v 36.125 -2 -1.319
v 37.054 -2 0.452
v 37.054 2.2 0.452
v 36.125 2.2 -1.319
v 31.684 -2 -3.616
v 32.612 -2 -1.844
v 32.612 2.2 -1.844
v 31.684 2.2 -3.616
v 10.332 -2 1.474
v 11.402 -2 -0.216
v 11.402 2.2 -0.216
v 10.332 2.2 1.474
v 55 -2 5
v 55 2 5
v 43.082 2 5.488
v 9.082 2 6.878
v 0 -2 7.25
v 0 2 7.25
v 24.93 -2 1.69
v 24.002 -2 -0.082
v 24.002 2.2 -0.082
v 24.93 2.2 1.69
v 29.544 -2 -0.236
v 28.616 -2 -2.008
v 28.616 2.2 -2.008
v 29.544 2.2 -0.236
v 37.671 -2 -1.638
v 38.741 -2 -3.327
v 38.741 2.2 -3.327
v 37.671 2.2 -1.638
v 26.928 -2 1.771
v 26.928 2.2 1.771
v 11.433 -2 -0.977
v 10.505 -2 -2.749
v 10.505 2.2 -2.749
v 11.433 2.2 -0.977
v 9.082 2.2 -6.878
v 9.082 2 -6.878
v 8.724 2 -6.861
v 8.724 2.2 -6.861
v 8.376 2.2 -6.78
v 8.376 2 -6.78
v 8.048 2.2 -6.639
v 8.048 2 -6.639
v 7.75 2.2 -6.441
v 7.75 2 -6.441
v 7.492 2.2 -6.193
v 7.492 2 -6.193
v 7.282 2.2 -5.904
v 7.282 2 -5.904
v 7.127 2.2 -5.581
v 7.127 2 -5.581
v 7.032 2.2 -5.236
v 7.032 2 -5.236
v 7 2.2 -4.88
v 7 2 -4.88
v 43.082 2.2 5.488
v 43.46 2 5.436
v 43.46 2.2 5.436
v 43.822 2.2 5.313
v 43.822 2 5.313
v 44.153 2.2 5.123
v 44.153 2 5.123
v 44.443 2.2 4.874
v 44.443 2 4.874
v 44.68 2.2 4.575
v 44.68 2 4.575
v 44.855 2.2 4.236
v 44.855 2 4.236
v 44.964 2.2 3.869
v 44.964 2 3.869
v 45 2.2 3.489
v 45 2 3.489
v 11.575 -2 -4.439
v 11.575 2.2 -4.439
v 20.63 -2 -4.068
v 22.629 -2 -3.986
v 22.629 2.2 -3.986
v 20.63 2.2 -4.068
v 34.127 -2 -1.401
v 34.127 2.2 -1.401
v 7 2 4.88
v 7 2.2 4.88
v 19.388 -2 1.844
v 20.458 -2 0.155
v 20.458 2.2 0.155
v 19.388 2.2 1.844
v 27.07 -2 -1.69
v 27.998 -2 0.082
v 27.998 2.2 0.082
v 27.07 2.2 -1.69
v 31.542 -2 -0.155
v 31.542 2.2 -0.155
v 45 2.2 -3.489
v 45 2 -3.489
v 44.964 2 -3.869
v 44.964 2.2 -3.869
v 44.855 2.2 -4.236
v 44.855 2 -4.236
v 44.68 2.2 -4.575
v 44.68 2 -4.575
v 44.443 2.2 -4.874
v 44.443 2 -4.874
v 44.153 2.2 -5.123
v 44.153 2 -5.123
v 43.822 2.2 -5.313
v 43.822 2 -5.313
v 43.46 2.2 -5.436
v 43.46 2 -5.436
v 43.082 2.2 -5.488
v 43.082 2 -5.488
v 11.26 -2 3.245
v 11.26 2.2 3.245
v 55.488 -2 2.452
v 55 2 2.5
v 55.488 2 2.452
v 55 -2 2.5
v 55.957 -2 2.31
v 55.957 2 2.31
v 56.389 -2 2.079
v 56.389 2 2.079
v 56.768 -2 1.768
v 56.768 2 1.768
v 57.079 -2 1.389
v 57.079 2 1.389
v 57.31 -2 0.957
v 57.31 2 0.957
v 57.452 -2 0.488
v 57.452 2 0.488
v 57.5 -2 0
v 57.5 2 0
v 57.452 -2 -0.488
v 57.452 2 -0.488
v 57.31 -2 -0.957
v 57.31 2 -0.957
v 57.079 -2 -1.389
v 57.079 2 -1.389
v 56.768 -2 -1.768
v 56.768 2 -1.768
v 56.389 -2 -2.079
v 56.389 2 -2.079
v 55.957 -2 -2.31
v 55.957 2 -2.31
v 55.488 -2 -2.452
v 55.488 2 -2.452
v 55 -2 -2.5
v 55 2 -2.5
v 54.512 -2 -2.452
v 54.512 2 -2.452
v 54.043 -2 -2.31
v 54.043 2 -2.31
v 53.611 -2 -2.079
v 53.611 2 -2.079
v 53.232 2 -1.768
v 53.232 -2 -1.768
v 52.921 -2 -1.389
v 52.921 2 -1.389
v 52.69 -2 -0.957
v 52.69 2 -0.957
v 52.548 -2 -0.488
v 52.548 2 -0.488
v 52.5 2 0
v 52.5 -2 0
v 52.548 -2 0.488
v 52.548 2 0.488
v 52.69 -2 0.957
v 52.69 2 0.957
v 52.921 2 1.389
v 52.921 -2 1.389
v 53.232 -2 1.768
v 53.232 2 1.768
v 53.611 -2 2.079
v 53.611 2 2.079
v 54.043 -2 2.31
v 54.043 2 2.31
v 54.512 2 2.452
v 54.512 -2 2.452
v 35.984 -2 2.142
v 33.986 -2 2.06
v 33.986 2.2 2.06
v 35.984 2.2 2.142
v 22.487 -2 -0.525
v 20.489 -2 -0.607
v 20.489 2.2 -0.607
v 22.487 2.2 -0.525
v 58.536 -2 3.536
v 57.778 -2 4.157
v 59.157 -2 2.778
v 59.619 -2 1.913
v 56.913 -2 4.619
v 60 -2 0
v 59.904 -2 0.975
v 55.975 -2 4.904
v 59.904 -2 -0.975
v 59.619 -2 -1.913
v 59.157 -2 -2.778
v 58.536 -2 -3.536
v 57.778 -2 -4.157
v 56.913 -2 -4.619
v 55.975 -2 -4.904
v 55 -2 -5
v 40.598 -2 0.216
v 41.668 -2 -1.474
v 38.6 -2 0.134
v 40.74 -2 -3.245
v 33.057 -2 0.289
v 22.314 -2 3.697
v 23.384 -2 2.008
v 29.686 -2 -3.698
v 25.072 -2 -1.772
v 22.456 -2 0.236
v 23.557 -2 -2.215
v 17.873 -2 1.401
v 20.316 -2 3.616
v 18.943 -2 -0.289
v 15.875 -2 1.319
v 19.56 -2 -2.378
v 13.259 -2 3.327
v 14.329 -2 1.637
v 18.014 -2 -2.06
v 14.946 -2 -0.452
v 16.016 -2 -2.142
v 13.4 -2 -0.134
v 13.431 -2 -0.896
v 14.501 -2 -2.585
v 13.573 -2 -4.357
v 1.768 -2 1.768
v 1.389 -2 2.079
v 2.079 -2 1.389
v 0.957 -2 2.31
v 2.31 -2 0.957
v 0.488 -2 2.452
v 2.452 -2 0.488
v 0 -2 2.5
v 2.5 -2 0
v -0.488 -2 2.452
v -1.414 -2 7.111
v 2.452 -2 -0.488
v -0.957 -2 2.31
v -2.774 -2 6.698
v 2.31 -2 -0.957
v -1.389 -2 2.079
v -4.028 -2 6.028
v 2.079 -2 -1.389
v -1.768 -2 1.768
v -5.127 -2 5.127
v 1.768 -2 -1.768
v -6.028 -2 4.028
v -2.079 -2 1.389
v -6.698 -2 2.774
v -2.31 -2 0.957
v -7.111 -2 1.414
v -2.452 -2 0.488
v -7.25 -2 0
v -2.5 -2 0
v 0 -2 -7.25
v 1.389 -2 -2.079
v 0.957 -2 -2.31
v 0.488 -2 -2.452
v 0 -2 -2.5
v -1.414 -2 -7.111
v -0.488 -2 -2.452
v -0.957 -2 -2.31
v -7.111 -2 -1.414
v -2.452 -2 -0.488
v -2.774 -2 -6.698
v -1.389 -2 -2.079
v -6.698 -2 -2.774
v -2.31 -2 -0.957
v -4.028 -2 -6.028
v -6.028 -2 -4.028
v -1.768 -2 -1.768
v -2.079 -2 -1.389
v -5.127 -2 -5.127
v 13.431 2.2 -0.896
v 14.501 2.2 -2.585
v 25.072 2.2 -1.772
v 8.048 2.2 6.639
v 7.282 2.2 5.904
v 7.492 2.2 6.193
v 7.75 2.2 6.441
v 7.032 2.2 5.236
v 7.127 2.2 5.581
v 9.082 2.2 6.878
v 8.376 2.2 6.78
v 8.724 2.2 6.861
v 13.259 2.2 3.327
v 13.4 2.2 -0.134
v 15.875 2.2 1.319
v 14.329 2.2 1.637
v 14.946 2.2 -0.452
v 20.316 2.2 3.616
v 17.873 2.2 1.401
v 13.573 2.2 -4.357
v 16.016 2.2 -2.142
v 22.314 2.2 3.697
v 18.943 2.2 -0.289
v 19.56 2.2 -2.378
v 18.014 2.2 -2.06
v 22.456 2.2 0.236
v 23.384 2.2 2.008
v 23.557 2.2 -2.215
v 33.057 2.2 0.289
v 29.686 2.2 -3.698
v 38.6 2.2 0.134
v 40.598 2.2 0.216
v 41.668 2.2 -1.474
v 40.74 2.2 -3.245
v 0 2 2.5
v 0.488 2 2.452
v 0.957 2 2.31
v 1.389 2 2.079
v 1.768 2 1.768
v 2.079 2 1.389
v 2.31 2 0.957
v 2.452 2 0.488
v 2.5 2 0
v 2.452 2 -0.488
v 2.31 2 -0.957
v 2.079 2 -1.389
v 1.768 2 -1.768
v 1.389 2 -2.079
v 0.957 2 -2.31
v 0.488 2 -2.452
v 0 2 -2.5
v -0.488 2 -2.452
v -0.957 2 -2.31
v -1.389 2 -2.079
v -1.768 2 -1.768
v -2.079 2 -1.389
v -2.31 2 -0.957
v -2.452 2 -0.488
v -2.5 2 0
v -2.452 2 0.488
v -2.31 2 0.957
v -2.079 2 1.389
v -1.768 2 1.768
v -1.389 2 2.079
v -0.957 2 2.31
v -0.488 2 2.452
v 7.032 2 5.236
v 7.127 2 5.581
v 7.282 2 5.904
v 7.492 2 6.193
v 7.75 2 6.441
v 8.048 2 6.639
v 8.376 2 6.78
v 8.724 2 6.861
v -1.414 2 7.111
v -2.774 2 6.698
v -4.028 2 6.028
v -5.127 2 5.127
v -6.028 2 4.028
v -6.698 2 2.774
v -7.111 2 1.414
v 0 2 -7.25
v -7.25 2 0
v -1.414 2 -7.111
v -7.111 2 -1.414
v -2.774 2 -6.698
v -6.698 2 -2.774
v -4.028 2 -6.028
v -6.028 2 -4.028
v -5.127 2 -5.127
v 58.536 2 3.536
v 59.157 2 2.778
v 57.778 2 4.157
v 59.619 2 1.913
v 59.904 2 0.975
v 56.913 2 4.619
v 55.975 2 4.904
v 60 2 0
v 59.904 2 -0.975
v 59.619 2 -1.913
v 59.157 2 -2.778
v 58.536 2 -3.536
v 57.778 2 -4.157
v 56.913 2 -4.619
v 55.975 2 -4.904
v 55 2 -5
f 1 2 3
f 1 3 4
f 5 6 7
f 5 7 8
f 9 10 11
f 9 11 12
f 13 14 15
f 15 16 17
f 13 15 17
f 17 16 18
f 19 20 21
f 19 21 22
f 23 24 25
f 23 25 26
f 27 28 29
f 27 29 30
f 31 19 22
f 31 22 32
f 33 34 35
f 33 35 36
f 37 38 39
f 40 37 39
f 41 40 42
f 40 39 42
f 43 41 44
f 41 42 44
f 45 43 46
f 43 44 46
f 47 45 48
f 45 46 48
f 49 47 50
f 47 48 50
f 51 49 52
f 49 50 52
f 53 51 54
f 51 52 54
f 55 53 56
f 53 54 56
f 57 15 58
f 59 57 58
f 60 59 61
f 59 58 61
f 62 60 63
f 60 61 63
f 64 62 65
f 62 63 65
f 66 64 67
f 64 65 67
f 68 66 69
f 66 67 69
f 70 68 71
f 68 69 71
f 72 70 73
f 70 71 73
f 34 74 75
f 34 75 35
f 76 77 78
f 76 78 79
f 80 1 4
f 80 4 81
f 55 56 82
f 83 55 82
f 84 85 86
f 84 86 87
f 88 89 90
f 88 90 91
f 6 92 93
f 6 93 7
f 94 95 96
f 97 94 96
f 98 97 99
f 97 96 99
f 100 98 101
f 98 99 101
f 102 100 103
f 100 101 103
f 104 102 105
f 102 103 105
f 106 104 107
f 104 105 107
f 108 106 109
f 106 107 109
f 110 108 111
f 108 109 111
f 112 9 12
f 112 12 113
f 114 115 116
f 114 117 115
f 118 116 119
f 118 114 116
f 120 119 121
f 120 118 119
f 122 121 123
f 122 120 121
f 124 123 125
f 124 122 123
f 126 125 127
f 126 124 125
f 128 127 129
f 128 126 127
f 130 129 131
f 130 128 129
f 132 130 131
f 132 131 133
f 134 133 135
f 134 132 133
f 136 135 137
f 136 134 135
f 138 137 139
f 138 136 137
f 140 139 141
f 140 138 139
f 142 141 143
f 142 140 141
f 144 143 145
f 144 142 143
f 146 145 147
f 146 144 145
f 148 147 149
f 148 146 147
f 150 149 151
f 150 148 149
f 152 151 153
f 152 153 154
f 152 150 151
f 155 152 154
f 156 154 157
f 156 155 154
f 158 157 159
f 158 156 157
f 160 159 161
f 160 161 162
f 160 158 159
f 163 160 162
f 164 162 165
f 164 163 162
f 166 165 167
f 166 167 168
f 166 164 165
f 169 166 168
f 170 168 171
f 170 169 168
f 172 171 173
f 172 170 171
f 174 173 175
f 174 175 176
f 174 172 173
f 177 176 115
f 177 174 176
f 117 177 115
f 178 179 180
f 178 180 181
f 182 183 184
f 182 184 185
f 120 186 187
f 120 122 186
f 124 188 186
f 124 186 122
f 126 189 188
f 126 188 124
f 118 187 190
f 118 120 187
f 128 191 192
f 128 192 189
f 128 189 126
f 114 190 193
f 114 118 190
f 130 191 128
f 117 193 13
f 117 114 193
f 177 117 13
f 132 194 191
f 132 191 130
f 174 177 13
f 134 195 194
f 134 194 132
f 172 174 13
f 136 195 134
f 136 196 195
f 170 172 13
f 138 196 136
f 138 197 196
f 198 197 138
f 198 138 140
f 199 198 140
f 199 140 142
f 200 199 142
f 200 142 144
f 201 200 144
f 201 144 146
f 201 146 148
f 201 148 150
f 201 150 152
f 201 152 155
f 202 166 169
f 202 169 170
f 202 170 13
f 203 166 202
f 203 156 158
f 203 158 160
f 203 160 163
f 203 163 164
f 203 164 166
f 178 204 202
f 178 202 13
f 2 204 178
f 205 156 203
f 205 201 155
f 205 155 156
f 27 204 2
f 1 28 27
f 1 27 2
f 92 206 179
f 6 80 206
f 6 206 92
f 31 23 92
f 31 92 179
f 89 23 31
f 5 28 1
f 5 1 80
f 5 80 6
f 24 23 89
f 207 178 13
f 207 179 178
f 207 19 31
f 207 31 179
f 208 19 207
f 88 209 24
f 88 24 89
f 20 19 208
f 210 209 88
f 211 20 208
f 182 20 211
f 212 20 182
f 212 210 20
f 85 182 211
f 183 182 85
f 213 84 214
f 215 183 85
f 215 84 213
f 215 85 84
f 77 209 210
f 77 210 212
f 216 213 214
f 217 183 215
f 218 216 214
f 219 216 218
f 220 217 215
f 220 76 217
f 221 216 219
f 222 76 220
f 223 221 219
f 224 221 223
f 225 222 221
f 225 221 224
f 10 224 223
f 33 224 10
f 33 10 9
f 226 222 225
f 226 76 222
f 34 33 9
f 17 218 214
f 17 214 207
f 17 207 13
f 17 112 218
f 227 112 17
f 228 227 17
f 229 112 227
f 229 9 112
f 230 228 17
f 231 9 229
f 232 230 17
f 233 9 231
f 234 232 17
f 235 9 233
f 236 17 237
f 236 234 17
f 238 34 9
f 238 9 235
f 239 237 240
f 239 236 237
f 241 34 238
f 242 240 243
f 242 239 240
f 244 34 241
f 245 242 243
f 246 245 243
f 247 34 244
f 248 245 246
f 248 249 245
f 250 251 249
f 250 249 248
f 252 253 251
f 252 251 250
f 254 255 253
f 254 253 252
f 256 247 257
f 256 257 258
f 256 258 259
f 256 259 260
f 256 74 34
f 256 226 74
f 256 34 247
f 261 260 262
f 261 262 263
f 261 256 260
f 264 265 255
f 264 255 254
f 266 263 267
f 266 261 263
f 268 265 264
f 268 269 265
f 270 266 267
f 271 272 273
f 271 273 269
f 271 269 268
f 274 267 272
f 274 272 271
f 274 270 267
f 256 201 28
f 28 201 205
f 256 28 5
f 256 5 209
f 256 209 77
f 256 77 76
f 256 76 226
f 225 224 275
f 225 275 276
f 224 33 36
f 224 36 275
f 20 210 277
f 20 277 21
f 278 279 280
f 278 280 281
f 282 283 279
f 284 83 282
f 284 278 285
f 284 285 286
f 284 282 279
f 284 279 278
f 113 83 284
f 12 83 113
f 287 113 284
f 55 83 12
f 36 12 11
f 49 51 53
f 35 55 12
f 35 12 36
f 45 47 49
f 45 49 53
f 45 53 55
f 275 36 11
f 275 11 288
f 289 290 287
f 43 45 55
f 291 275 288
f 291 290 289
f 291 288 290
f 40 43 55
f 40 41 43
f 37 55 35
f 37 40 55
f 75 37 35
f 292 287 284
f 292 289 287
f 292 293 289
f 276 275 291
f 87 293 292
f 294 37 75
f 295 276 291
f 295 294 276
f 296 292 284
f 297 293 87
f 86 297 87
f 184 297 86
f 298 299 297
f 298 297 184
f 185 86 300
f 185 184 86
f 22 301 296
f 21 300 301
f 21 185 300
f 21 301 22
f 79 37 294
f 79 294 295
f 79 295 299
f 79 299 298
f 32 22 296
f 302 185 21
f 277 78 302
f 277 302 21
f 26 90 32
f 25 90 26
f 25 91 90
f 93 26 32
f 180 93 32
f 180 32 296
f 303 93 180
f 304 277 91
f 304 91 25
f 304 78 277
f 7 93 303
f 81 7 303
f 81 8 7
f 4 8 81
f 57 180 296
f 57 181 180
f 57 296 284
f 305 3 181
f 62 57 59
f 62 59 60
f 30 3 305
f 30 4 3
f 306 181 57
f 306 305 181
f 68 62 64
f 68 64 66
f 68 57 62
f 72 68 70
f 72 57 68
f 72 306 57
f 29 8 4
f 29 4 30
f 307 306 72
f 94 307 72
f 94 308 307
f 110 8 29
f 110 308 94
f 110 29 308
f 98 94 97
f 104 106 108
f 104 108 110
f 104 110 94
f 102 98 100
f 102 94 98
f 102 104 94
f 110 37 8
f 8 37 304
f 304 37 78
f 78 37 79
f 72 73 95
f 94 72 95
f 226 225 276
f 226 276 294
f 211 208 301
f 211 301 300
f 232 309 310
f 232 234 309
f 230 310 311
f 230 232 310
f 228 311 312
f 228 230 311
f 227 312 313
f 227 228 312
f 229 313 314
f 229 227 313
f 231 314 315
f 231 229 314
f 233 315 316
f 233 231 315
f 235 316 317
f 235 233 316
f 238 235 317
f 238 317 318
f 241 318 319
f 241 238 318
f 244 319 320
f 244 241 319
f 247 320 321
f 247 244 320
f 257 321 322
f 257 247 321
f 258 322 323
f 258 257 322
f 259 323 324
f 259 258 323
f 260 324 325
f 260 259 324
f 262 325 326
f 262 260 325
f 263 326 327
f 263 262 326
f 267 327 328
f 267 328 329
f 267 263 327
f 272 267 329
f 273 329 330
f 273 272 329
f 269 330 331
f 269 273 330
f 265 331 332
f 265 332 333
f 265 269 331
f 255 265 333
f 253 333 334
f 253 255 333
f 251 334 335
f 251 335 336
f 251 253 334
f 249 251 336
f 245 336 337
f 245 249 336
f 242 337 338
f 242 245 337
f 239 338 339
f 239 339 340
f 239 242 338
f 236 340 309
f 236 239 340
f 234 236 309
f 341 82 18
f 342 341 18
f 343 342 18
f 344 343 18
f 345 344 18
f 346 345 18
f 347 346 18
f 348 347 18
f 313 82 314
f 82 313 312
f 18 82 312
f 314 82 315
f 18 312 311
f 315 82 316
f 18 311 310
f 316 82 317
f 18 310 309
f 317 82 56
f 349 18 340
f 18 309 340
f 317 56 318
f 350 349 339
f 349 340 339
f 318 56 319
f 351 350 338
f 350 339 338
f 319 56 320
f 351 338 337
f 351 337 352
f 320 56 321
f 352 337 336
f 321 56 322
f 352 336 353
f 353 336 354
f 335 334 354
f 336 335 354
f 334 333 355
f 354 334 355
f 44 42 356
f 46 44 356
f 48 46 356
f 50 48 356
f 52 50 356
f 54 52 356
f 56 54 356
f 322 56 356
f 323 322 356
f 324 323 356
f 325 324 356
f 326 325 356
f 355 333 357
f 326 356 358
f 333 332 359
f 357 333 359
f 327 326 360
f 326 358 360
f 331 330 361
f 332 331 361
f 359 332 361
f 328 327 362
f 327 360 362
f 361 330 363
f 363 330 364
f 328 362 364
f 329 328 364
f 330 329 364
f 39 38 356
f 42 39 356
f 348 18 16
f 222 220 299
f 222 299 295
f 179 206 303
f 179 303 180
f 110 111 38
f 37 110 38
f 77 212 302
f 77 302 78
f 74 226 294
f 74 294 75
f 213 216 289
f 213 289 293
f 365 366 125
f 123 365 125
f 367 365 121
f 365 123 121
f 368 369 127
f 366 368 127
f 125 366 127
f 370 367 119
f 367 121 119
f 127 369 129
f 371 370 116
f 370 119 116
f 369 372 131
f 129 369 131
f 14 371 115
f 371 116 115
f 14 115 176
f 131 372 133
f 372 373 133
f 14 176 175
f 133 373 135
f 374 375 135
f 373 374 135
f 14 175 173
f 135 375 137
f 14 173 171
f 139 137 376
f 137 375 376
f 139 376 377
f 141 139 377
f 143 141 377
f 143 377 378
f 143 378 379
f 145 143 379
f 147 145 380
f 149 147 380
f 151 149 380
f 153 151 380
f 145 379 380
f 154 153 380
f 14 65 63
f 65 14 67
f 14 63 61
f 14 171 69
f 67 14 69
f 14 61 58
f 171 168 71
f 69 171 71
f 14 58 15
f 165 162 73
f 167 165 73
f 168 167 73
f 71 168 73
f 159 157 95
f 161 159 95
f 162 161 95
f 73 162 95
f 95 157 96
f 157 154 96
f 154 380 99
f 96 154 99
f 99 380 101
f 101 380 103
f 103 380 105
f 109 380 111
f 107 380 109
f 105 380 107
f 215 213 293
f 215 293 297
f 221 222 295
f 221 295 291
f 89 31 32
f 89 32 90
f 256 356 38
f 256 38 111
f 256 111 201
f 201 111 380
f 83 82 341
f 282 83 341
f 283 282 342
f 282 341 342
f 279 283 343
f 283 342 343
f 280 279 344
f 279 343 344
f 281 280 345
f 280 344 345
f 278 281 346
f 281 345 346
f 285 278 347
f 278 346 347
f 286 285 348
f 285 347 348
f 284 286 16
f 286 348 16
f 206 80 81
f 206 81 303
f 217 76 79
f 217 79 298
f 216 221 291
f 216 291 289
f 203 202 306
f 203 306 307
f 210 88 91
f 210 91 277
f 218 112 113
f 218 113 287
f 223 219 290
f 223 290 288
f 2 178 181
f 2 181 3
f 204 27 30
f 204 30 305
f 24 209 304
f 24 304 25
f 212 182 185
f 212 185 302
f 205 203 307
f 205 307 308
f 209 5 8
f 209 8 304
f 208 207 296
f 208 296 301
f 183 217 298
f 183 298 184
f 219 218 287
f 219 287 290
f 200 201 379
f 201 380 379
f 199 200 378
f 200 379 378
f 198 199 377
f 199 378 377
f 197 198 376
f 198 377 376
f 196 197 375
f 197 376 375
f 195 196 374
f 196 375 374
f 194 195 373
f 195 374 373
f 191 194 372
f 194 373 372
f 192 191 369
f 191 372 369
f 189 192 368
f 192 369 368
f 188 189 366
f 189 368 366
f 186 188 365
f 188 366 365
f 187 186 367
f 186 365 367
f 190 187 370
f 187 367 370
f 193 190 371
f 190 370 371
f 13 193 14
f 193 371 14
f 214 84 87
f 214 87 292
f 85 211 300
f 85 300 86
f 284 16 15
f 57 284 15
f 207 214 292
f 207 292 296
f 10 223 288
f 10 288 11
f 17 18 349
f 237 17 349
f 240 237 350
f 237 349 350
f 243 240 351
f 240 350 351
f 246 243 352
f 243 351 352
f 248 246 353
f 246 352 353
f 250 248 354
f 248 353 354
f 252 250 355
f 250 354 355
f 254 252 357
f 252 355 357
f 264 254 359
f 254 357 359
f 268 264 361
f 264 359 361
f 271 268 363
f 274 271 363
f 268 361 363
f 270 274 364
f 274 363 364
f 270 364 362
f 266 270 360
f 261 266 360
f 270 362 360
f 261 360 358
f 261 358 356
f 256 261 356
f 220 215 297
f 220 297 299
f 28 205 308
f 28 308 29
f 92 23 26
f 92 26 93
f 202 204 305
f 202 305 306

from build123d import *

# Parameters (mm, degrees)
CROQUIS1_R              = 2.5
SALIENTE_EXTRUIR1_DEPTH = 2
SALIENTE_EXTRUIR2_DEPTH = 0.2
PATR_N_START            = -2
PATR_N_DE_RAYADO2_DEPTH = 4.2


# Read off the part's stored shape, not the designer's step: Patrón de rayado2
with BuildPart() as part:
    # Croquis1 → Saliente-Extruir1 (new, symmetric)
    with BuildSketch(Plane(origin=(0, 0, 0), x_dir=(1, 0, 0), z_dir=(0, 1, 0))):
        with BuildLine():
            Line((0, 7.25), (55, 5))
            ThreePointArc((55, 5), (60, 0), (55, -5))
            Line((55, -5), (0, -7.25))
            ThreePointArc((0, -7.25), (-7.25, 0), (0, 7.25))
        make_face()
        with Locations(Location((0, 0, 0), (0, 0, 270))):
            Circle(CROQUIS1_R, mode=Mode.SUBTRACT)
        with Locations(Location((55, 0, 0), (0, 0, 270))):
            Circle(CROQUIS1_R, mode=Mode.SUBTRACT)
    extrude(amount=SALIENTE_EXTRUIR1_DEPTH, both=True)

    # Croquis2 → Saliente-Extruir2 (add)
    with BuildSketch(Plane(origin=(0, 2, 0), x_dir=(1, 0, 0), z_dir=(0, 1, 0))):
        with BuildLine():
            Line((7, 4.880145328), (7, -4.880145328))
            ThreePointArc((7, -4.880145328), (7.614990904, -6.322972346), (9.081749804, -6.878473872))
            Line((9.081749804, -6.878473872), (43.081749804, -5.487564781))
            ThreePointArc((43.081749804, -5.487564781), (44.442827018, -4.874245333), (45, -3.489236237))
            Line((45, -3.489236237), (45, 3.489236237))
            ThreePointArc((45, 3.489236237), (44.442827018, 4.874245333), (43.081749804, 5.487564781))
            Line((43.081749804, 5.487564781), (9.081749804, 6.878473872))
            ThreePointArc((9.081749804, 6.878473872), (7.614990904, 6.322972346), (7, 4.880145328))
        make_face()
    extrude(amount=SALIENTE_EXTRUIR2_DEPTH)

    # Patrón de rayado2 outline → Patrón de rayado2 (cut)
    with BuildSketch(Plane(origin=(0, 0, 0), x_dir=(1, 0, 0), z_dir=(0, 1, 0)).offset(PATR_N_START)):
        Polygon((10.504788453, 2.748868179), (11.433155318, 0.977389992), (13.431483862, 0.895640188), (14.501445541, 2.585368571), (13.573078676, 4.356846757), (11.574750132, 4.438596561), align=None)
        Polygon((20.48865892, 0.606937572), (22.486987464, 0.525187768), (23.556949143, 2.21491615), (22.628582278, 3.986394337), (20.630253734, 4.068144141), (19.560292055, 2.378415759), align=None)
        Polygon((29.544162522, 0.236485152), (31.542491066, 0.154735348), (32.612452745, 1.84446373), (31.68408588, 3.615941917), (29.685757336, 3.697691721), (28.615795657, 2.007963338), align=None)
        Polygon((38.599666124, -0.133967268), (40.597994668, -0.215717072), (41.667956347, 1.47401131), (40.739589483, 3.245489496), (38.741260939, 3.327239301), (37.67129926, 1.637510918), align=None)
        Polygon((19.387547255, -1.84423492), (20.31591412, -3.615713106), (22.314242664, -3.69746291), (23.384204343, -2.007734528), (22.455837478, -0.236256342), (20.457508934, -0.154506537), align=None)
        Polygon((11.260410517, -3.245260686), (13.258739061, -3.32701049), (14.32870074, -1.637282108), (13.400333876, 0.134196079), (11.402005332, 0.215945883), (10.332043653, -1.473782499), align=None)
        Polygon((33.057175058, -0.288588211), (33.985541923, -2.060066397), (35.983870467, -2.141816201), (37.053832146, -0.452087819), (36.125465281, 1.319390367), (34.127136737, 1.401140171), align=None)
        Polygon((24.930038321, -1.689613977), (26.928366865, -1.771363781), (27.998328544, -0.081635399), (27.069961679, 1.689842788), (25.071633135, 1.771592592), (24.001671456, 0.081864209), align=None)
        Polygon((15.874534719, -1.319161557), (17.872863263, -1.400911361), (18.942824942, 0.288817021), (18.014458077, 2.060295208), (16.016129533, 2.142045012), (14.946167854, 0.45231663), align=None)
    extrude(amount=PATR_N_DE_RAYADO2_DEPTH, mode=Mode.SUBTRACT)


solid = part.part
